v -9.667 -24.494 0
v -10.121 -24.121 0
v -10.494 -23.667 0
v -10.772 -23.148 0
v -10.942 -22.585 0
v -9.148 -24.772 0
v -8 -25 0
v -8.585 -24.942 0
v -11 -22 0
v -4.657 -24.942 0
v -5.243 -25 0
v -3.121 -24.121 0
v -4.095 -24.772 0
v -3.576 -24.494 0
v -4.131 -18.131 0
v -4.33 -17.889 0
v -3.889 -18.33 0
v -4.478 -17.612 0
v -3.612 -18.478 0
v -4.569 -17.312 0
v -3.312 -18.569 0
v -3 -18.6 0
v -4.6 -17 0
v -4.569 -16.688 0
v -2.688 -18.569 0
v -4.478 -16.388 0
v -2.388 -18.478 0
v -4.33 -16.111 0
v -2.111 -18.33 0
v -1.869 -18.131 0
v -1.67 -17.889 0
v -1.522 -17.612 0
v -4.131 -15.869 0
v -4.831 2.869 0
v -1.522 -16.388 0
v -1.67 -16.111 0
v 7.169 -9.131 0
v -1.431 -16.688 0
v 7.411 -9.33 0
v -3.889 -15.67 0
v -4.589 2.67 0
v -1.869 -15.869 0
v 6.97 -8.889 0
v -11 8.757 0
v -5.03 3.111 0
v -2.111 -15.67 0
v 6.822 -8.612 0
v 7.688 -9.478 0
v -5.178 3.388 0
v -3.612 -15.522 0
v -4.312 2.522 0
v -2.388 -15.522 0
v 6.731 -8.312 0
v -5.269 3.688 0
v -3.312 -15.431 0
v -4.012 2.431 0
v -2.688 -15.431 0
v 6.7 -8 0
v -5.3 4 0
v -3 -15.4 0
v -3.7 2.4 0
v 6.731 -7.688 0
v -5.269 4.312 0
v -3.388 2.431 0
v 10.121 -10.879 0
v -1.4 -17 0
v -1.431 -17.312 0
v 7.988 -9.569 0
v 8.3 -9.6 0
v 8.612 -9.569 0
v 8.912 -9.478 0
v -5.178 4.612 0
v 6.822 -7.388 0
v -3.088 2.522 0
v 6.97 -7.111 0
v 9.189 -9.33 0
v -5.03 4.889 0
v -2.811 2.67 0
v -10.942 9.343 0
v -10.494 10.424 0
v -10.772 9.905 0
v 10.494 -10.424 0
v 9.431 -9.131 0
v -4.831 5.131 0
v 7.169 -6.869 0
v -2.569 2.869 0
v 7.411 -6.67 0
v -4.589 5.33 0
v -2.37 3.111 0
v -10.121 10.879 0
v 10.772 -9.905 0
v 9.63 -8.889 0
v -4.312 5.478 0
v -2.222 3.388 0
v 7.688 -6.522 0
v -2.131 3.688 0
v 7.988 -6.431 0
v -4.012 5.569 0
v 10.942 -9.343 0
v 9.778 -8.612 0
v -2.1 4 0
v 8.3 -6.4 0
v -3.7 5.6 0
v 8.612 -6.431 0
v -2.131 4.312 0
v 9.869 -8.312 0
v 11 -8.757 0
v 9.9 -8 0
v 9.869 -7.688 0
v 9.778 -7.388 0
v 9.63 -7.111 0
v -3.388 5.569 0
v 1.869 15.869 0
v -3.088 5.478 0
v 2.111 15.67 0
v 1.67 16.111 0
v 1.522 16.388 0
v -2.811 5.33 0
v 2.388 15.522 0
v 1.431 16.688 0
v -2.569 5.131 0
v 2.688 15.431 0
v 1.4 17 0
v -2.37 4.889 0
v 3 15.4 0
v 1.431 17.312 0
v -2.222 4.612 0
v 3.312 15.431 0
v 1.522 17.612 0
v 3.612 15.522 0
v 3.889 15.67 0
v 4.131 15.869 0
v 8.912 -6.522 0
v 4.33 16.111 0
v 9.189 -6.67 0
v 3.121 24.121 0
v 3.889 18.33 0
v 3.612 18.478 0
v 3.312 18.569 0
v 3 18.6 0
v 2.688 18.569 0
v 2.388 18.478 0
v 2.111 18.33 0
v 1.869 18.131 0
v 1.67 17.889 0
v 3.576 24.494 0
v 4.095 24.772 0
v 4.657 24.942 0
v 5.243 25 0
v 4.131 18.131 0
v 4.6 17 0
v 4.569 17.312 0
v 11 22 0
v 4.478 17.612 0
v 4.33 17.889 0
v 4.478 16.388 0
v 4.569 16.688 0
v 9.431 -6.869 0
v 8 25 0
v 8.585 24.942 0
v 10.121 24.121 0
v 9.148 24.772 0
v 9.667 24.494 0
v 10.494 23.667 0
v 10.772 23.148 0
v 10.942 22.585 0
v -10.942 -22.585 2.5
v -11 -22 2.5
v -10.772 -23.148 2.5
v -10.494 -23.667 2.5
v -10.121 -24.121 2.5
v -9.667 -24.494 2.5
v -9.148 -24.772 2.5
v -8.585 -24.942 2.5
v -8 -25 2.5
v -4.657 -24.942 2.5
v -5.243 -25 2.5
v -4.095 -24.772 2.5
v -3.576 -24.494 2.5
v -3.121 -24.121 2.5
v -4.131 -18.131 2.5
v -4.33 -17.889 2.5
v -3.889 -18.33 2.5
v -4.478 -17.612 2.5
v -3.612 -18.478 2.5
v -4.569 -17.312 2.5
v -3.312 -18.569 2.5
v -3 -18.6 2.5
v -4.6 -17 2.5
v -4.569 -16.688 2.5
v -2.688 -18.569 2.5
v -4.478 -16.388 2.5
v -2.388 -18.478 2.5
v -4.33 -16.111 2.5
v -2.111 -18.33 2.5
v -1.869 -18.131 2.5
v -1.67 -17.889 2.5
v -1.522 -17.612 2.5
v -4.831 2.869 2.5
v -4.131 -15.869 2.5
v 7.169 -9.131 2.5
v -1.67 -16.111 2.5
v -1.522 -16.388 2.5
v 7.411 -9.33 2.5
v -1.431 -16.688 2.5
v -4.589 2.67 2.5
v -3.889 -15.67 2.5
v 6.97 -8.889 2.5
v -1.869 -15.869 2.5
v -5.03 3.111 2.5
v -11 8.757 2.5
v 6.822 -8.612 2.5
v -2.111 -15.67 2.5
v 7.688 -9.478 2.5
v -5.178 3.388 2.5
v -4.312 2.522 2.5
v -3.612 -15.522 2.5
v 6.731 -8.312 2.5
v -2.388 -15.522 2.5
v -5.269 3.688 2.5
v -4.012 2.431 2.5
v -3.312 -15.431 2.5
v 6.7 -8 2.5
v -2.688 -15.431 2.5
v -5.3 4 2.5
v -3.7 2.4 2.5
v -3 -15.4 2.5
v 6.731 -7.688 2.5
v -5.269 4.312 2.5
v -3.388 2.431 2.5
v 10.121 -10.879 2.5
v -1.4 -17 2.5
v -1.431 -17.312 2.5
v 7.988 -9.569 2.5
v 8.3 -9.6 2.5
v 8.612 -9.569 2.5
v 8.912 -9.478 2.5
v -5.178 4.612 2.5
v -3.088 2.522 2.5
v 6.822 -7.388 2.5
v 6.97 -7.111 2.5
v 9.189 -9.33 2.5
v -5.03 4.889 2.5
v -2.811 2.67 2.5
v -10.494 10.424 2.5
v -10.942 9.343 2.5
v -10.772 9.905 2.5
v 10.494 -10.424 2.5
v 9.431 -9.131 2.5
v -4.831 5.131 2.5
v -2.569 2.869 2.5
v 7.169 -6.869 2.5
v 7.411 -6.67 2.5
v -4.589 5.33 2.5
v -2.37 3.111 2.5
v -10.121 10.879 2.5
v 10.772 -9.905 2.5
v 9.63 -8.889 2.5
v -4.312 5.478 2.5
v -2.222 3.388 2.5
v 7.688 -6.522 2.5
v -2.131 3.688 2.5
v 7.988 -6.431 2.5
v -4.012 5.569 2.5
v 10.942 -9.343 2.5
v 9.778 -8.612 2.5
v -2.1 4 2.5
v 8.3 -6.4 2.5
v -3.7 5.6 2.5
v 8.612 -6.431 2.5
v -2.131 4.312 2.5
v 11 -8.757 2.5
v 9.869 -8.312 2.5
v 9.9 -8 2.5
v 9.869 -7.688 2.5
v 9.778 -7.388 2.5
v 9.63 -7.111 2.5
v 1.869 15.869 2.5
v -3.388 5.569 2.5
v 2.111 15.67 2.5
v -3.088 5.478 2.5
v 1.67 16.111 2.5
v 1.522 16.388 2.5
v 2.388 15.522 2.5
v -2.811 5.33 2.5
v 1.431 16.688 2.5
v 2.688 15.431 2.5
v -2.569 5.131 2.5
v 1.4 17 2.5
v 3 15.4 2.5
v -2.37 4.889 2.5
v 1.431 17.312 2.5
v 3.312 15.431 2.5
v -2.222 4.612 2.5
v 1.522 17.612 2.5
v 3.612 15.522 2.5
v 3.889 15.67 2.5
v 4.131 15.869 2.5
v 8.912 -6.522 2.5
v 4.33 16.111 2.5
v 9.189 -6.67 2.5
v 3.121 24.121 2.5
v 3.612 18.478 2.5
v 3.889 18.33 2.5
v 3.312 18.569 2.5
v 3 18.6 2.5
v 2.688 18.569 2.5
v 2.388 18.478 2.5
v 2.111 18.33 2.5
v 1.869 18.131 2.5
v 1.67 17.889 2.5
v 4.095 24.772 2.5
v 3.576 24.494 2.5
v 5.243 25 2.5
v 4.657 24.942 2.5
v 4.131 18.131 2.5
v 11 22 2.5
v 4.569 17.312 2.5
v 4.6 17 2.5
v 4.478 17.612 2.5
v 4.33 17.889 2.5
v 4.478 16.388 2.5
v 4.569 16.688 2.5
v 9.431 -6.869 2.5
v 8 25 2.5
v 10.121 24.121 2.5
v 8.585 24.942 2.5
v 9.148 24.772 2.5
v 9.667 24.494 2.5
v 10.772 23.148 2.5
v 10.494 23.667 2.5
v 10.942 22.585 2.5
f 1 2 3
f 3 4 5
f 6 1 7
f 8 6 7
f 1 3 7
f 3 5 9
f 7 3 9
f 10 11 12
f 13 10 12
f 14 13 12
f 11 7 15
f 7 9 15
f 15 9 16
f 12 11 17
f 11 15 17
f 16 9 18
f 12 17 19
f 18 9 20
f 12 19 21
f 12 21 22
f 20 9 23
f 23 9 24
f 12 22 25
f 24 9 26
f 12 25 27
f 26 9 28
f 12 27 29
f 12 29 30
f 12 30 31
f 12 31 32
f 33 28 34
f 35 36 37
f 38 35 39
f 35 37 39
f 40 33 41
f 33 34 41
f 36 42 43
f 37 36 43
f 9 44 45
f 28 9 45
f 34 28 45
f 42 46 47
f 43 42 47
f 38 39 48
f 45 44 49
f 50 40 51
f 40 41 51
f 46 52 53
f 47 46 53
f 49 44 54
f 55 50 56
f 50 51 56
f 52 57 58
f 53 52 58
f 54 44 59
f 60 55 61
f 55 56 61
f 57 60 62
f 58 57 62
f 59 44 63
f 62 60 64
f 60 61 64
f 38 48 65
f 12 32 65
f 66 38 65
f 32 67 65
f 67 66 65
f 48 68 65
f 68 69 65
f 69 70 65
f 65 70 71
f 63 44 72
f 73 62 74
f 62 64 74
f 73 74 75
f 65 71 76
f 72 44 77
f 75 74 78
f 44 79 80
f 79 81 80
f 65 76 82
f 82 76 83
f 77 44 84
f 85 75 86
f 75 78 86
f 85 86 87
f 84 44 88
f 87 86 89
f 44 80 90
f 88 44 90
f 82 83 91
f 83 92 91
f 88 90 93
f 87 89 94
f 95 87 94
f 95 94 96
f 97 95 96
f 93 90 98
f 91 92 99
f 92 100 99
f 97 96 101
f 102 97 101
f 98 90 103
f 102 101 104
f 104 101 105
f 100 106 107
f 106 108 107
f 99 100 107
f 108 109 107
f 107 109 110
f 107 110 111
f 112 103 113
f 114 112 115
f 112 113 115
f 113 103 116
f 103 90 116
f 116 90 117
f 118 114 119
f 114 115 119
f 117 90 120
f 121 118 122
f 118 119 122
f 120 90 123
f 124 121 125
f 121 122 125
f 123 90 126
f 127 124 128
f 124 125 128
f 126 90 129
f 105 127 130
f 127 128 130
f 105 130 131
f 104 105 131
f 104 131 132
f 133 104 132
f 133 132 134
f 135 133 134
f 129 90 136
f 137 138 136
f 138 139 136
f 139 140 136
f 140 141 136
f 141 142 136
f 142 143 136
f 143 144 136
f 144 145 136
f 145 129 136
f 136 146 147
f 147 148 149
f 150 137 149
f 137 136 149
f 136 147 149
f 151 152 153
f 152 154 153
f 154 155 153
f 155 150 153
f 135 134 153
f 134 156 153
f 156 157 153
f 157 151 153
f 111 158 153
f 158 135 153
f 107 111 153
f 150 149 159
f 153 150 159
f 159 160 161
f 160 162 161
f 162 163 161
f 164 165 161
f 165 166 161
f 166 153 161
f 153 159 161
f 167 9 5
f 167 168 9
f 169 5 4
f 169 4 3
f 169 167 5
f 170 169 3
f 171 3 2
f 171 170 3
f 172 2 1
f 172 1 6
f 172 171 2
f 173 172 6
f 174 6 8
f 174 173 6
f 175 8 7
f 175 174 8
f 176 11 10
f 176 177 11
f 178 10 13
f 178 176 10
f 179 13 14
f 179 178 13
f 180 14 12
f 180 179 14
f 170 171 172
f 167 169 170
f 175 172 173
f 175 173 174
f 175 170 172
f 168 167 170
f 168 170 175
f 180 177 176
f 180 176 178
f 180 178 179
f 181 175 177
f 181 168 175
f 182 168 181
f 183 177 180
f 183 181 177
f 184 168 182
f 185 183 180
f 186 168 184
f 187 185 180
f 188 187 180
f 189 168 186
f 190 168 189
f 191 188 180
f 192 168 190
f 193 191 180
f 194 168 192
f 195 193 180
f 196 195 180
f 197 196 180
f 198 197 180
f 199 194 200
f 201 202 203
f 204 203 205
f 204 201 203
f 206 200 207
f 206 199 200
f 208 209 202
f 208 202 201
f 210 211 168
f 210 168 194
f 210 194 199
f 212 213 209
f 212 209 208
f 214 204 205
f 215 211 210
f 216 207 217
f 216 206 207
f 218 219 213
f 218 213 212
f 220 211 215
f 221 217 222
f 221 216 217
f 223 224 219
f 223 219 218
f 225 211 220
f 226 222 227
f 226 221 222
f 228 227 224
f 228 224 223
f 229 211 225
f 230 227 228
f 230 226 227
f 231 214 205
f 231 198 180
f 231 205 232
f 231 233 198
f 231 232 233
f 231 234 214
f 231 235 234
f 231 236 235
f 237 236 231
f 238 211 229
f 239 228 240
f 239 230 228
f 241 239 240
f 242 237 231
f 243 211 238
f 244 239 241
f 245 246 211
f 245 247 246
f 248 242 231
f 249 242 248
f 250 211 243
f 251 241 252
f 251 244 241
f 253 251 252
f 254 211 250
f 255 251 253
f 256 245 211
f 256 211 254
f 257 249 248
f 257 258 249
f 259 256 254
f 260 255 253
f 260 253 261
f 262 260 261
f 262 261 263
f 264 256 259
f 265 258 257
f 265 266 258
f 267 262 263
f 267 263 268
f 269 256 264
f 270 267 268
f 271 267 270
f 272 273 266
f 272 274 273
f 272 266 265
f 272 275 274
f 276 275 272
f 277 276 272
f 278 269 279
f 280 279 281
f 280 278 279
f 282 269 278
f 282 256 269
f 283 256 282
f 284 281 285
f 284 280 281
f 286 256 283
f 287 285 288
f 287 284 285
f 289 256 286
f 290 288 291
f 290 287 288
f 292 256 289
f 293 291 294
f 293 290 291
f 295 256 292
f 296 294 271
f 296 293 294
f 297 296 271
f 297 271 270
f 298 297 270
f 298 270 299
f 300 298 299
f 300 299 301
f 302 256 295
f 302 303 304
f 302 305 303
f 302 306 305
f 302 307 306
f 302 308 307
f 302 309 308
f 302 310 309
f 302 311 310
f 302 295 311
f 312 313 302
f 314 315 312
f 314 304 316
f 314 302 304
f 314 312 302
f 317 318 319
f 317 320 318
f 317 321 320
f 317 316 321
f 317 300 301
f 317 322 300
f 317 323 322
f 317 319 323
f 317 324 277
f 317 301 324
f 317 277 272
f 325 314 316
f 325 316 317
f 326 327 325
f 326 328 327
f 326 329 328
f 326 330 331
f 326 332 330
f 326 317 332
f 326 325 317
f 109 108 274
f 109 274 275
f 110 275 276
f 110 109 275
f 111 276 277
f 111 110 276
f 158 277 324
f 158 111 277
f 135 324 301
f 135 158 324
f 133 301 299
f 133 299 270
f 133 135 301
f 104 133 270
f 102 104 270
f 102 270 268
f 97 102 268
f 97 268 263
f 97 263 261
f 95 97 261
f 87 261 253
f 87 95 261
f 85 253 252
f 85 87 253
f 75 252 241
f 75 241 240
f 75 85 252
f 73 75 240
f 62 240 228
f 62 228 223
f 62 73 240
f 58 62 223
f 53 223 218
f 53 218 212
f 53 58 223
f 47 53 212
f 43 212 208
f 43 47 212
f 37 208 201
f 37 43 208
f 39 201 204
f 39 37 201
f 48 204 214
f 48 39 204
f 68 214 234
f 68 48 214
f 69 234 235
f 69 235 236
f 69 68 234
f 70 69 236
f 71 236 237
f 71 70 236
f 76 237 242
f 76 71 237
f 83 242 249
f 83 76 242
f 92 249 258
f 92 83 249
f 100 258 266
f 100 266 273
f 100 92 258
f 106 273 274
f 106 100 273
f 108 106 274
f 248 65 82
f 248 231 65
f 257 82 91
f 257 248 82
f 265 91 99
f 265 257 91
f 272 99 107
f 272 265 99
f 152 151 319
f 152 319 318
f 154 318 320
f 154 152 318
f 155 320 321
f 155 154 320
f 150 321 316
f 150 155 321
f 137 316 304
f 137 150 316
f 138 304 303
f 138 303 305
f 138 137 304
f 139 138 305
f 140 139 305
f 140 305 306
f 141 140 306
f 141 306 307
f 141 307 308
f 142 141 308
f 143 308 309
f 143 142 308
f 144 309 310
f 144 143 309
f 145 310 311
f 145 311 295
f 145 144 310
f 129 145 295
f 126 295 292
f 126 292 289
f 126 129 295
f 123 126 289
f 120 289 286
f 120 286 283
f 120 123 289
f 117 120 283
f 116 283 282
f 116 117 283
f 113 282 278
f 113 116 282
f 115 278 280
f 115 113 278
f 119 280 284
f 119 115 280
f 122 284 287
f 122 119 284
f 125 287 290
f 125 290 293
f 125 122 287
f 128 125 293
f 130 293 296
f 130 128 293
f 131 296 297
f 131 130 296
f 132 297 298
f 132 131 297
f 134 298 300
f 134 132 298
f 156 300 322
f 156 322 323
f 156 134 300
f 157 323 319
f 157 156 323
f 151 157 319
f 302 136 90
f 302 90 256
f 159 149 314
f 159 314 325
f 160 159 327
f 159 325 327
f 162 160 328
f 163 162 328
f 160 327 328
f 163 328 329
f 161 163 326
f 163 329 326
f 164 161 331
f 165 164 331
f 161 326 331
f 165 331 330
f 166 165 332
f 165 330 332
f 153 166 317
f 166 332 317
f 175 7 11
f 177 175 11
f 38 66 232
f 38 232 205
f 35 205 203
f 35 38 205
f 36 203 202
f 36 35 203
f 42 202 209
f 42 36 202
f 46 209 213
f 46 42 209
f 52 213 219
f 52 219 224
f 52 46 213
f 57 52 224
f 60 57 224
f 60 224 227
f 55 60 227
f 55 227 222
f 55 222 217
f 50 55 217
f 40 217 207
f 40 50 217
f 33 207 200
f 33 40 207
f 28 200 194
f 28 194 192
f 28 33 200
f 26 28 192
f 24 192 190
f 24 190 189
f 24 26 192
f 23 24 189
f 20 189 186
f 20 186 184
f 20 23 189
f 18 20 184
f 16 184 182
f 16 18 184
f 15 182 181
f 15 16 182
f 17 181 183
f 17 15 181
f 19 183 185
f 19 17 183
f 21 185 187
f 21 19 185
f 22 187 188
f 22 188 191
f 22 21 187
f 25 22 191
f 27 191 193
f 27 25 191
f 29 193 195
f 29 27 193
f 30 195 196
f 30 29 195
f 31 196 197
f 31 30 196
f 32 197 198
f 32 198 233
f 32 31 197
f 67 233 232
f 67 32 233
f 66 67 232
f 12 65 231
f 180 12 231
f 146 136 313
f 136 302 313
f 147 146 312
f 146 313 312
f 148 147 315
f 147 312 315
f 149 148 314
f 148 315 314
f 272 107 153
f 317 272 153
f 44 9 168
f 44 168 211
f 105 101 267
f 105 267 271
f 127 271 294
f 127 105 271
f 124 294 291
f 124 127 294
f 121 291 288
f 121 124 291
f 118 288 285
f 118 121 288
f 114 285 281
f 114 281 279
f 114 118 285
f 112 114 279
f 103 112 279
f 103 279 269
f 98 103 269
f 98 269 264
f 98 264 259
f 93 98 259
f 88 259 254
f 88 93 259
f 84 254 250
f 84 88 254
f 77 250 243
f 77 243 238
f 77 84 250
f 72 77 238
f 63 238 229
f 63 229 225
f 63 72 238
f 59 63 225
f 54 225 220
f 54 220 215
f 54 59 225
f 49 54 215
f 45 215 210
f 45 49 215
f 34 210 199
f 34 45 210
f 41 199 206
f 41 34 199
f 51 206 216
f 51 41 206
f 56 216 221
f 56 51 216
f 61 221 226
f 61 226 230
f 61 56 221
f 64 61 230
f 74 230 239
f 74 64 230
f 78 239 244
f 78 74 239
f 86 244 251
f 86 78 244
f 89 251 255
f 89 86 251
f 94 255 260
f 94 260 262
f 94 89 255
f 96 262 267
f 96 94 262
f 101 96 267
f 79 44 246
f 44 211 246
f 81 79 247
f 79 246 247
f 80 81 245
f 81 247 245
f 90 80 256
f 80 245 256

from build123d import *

# Parameters (mm, degrees)
SKETCH_1_W      = 22
SKETCH_1_H      = 50
SKETCH_1_R      = 1.6
EXTRUDE_1_DEPTH = 2.5
CHAMFER_1_SIZE  = 15
FILLET_1_R      = 3


with BuildPart() as part:
    # 草图1 → 凸台-拉伸1 (new body)
    with BuildSketch(Plane.XY):
        Rectangle(SKETCH_1_W, SKETCH_1_H)
        with Locations((-3, -17)):
            Circle(SKETCH_1_R, mode=Mode.SUBTRACT)
        with Locations((3, 17)):
            Circle(SKETCH_1_R, mode=Mode.SUBTRACT)
        with Locations((-3.7, 4)):
            Circle(SKETCH_1_R, mode=Mode.SUBTRACT)
        with Locations((8.3, -8)):
            Circle(SKETCH_1_R, mode=Mode.SUBTRACT)
    extrude(amount=EXTRUDE_1_DEPTH)

    # 倒角1
    chamfer_1_edges = [part.edges().sort_by_distance(p)[0] for p in [
        (11, -25, 1.25),
        (-11, 25, 1.25),
    ]]
    chamfer(chamfer_1_edges, length=CHAMFER_1_SIZE)

    # 圆角1
    fillet_1_edges = [part.edges().sort_by_distance(p)[0] for p in [
        (-11, 10, 1.25),
        (4, 25, 1.25),
        (11, -10, 1.25),
        (-4, -25, 1.25),
        (11, 25, 1.25),
        (-11, -25, 1.25),
    ]]
    fillet(fillet_1_edges, radius=FILLET_1_R)


solid = part.part
